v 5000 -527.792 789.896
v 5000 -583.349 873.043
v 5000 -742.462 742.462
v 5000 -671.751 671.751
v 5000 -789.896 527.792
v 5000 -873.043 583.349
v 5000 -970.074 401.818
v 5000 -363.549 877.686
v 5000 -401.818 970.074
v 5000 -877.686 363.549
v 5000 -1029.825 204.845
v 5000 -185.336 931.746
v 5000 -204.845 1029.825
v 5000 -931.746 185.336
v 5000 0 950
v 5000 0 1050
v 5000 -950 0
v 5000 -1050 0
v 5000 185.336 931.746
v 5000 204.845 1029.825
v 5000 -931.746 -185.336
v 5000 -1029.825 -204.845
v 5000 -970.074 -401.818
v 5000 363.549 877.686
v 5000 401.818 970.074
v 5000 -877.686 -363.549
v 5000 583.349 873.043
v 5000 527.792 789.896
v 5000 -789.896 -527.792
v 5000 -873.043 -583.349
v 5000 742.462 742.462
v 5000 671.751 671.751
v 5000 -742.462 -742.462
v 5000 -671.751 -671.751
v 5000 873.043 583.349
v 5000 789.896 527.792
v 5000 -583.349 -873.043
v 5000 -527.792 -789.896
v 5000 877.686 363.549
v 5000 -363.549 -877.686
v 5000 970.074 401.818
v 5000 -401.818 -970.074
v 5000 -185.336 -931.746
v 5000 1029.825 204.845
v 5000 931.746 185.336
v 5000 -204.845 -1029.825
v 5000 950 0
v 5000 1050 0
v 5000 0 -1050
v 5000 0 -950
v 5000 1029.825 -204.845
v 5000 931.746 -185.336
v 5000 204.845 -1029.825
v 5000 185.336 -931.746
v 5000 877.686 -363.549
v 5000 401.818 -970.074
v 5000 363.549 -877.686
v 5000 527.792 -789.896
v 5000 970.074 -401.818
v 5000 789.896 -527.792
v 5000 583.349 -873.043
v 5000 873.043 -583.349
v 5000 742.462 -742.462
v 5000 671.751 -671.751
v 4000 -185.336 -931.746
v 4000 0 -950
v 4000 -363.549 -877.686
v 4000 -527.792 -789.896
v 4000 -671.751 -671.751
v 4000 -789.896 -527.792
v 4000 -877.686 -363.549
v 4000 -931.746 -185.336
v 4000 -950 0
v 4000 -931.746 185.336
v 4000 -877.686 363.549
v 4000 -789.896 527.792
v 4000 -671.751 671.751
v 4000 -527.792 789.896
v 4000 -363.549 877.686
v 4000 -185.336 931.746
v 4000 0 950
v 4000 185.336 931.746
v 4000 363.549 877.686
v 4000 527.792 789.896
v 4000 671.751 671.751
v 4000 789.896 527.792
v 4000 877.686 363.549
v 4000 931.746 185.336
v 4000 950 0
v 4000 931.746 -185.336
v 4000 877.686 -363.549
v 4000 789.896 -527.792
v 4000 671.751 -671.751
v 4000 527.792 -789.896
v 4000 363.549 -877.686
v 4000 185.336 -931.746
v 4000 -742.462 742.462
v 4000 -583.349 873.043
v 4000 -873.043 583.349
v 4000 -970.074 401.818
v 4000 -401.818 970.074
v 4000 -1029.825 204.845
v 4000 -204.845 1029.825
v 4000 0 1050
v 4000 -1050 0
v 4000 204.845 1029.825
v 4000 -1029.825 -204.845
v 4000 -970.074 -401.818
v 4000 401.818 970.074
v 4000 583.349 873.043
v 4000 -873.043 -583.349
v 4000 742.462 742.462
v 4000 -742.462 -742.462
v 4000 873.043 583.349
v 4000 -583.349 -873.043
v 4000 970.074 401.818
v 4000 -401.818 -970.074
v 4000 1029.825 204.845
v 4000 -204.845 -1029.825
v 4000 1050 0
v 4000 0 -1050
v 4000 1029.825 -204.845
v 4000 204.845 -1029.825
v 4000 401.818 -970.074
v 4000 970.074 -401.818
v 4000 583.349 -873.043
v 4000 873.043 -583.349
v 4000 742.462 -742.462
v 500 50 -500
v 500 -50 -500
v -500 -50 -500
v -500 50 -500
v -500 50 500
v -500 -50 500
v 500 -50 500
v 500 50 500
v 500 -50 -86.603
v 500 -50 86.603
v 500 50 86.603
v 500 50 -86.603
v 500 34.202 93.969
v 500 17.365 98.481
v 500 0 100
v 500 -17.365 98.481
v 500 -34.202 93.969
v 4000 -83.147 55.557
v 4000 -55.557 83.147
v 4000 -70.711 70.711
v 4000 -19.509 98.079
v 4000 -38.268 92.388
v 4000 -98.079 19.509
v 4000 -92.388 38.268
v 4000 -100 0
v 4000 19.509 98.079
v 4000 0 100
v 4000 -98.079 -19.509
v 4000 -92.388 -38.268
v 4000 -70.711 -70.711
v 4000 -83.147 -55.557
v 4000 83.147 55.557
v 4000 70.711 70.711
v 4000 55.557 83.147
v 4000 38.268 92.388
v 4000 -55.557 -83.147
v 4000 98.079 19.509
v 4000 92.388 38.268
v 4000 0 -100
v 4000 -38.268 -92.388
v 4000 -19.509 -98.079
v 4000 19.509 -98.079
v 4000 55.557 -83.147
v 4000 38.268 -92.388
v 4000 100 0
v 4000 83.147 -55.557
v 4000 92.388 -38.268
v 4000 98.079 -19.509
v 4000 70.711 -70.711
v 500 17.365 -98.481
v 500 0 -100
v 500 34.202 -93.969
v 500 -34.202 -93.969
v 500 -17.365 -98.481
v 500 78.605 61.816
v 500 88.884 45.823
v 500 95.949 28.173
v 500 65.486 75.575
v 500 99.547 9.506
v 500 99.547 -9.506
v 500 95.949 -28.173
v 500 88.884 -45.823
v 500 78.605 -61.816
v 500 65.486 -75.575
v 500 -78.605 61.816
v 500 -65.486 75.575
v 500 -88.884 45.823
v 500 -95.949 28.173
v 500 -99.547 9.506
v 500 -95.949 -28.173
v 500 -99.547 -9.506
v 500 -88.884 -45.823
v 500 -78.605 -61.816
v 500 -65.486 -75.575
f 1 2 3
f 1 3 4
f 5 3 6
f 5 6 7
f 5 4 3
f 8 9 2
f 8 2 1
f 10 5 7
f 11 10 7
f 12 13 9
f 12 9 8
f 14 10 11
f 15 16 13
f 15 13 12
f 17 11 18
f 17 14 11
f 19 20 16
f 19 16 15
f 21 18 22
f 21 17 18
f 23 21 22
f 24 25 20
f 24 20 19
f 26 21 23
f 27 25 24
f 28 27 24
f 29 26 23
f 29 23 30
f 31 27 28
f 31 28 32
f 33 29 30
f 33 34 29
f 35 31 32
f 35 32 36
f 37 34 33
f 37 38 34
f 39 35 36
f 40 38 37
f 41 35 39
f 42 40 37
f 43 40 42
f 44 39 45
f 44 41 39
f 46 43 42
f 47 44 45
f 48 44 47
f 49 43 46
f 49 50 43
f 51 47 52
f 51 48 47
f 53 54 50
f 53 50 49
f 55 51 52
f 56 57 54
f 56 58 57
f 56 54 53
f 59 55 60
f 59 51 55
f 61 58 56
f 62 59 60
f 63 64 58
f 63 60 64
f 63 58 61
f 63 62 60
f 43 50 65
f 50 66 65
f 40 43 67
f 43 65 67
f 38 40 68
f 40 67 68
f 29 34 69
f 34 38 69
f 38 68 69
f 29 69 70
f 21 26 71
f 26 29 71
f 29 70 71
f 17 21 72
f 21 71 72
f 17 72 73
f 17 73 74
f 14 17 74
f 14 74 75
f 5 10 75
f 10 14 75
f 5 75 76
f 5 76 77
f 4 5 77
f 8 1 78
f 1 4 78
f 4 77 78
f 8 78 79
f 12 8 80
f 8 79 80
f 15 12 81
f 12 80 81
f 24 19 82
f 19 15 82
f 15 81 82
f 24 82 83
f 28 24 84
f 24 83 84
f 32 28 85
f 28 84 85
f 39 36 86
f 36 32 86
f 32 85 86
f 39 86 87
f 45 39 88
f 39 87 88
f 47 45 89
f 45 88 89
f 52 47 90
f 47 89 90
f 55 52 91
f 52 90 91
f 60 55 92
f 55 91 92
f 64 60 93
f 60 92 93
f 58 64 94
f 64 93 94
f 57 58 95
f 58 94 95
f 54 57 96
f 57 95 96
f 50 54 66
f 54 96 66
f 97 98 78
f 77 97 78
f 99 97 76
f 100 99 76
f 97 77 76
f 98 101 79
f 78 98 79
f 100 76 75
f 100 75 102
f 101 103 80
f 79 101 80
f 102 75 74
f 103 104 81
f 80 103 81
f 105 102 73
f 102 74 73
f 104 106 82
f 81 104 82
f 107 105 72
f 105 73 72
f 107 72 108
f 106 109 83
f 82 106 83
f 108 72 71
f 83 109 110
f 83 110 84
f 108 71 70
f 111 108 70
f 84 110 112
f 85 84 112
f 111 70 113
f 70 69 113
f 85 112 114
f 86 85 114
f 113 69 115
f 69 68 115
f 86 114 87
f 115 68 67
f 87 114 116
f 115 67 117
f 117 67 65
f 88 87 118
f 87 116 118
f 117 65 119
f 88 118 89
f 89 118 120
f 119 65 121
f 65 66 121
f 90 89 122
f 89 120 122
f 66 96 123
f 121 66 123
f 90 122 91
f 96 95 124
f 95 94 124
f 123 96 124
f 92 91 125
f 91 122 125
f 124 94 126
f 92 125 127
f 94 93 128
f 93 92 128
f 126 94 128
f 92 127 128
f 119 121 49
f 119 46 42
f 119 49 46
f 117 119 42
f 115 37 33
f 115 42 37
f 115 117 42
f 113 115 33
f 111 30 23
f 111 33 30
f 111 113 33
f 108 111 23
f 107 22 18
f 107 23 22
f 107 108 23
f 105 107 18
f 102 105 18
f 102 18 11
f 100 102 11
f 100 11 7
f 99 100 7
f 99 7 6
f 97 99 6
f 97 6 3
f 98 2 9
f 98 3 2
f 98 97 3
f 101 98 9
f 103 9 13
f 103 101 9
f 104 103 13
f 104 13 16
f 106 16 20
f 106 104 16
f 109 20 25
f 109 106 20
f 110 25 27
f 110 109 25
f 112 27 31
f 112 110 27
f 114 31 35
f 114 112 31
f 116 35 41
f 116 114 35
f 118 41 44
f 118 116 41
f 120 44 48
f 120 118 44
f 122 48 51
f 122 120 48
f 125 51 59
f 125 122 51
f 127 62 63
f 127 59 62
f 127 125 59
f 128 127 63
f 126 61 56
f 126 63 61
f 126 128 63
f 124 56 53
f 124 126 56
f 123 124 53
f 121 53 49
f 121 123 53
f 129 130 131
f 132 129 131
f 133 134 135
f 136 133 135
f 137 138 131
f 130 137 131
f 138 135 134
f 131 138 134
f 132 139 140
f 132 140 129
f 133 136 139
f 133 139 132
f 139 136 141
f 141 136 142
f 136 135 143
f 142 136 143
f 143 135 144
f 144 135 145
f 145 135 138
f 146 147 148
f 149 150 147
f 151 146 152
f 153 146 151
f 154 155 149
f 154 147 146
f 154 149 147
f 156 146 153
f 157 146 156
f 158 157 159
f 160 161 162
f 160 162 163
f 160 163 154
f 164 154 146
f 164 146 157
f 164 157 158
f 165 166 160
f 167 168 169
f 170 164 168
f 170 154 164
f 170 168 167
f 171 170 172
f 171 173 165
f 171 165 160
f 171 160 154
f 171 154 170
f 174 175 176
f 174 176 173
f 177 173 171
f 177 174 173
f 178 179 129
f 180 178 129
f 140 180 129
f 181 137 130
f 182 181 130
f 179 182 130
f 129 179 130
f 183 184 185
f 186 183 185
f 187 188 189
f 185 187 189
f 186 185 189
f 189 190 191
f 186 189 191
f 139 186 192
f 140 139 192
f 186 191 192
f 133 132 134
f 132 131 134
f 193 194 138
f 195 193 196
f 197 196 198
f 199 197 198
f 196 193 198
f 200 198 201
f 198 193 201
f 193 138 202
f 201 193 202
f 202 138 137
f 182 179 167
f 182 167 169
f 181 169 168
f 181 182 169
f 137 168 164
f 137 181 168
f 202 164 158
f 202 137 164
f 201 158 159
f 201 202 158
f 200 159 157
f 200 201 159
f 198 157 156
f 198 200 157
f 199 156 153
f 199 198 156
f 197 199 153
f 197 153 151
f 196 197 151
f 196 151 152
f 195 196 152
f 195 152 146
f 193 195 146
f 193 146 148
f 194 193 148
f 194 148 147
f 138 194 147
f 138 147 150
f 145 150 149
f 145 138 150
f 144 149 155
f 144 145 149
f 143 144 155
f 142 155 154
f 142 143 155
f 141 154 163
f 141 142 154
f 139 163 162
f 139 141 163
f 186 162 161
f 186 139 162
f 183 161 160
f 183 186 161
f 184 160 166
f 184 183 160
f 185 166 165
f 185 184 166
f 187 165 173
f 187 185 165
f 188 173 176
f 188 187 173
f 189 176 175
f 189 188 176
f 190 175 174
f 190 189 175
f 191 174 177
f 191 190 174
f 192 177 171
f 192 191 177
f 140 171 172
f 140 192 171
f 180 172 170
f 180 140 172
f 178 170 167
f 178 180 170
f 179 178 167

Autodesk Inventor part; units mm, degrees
ref_plane "YZ Plane" through (0, 0, 0) normal (1, 0, 0) x (0, 1, 0)
ref_plane "XZ Plane" through (0, 0, 0) normal (0, 1, 0) x (-1, 0, 0)
ref_plane "XY Plane" through (0, 0, 0) normal (0, 0, 1) x (1, 0, 0)
sketch "Sketch3" plane through (0, 0, 0) normal (0, 1, 0) x (-1, 0, 0)
  line L0 (-500, -500) -> (500, -500)
  line L1 (500, -500) -> (500, 500)
  line L2 (500, 500) -> (-500, 500)
  line L3 (-500, 500) -> (-500, -500)
  line L4 (-500, -500) -> (500, 500) construction
  line L5 (500, -500) -> (-500, 500) construction
  point P0 (0, 0)
  dimension "d8" = 1000
  dimension "d9" = 1000
extrude "Extrusion3" add sketch "Sketch3" along normal mid plane 100
sketch "Sketch4" plane through (500, -50, -500) normal (1, 0, 0) x (0, 0, -1)
  circle A0 centre (-500, 50) radius 100
  dimension "d12" = 100
extrude "Extrusion4" add sketch "Sketch4" along normal blind 3500
sketch "Sketch6" plane through (4000, 0, 0) normal (1, 0, 0) x (0, 0, -1)
  circle A0 centre (0, 0) radius 1000 construction
  circle A1 centre (0, 0) radius 1050
  circle A2 centre (0, 0) radius 950
  dimension "d18" = 1000
  dimension "d21" = 50
  dimension "d22" = 50
extrude "Extrusion6" add sketch "Sketch6" along normal blind 1000
properties part number "EAO Test Ref"
